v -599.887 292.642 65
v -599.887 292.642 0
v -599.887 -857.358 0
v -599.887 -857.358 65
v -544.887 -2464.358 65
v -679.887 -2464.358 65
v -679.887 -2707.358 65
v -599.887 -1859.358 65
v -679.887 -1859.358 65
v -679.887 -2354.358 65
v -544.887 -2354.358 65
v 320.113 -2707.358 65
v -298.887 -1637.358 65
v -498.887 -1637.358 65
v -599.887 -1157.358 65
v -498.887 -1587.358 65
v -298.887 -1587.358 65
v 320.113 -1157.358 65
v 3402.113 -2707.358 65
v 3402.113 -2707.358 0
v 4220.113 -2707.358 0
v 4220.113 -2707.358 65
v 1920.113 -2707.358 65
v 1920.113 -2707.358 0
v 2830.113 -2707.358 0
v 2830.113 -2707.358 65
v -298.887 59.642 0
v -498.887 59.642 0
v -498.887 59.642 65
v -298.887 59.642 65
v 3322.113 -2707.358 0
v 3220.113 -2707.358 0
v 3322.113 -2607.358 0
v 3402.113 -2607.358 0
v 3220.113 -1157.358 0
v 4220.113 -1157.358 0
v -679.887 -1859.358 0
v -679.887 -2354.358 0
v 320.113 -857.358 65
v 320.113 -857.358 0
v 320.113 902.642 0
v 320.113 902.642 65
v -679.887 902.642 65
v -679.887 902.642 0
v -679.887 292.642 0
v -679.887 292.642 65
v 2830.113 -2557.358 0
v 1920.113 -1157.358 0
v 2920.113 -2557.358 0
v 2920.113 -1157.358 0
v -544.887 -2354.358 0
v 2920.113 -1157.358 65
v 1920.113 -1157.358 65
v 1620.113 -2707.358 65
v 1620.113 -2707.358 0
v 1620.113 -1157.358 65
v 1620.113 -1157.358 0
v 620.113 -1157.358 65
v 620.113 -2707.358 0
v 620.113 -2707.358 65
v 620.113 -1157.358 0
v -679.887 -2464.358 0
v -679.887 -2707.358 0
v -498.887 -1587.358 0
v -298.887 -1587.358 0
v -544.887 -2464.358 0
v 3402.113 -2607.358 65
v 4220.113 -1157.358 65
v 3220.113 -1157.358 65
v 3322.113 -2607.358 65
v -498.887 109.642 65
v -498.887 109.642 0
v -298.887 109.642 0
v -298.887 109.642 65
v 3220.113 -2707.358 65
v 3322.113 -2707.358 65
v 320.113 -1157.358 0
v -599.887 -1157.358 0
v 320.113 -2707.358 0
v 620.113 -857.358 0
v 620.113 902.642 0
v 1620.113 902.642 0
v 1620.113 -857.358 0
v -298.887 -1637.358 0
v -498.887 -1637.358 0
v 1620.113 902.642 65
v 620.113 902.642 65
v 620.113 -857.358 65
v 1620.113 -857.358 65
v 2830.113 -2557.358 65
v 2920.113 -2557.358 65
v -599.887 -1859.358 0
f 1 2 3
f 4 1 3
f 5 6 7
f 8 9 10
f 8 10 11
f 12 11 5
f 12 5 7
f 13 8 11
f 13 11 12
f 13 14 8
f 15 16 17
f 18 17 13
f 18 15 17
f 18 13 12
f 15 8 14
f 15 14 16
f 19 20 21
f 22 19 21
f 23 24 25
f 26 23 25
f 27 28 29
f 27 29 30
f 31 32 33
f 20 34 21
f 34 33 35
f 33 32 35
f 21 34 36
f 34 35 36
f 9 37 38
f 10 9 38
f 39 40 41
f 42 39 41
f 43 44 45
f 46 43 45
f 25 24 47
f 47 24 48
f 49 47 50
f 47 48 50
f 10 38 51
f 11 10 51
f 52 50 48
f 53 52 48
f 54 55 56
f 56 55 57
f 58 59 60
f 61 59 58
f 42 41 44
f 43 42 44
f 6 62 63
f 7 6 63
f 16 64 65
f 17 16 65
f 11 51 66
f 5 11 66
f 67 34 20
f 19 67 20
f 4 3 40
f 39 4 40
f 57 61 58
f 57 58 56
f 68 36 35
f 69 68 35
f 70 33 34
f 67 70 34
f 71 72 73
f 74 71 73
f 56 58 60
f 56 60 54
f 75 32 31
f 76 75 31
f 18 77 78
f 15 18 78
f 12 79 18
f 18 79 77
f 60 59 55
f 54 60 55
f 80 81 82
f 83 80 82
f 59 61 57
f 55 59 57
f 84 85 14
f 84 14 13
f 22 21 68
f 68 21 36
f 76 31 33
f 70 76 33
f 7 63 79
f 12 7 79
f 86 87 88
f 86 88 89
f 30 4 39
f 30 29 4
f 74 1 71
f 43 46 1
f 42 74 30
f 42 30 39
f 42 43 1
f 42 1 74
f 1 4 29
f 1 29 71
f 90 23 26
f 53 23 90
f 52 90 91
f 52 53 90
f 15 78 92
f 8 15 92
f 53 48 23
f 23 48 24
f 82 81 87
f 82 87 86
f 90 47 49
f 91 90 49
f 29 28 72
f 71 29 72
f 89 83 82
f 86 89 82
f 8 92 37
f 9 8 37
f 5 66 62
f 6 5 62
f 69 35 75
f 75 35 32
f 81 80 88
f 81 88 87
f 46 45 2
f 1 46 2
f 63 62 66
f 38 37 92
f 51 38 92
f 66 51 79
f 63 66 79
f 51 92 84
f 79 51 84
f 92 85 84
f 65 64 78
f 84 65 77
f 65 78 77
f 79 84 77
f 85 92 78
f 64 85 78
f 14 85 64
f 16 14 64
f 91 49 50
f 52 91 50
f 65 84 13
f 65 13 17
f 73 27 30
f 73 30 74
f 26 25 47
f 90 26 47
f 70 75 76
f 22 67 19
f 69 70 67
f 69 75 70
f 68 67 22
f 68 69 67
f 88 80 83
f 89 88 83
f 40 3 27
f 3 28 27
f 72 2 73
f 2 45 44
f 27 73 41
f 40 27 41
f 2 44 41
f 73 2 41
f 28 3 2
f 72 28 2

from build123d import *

# Parameters (mm, degrees)
F0_W     = 200
F0_H     = 50
F0_W_2   = 1000
F0_H_2   = 1760
F0_H_3   = 1550
F1_DEPTH = 65


with BuildPart() as f1:
    # F0 (on Top) → F1 (new body)
    with BuildSketch(Plane.XY):
        Polygon((320.112689, 902.641755), (-679.887311, 902.641755), (-679.887311, 292.641755), (-599.887311, 292.641755), (-599.887311, -857.358245), (320.112689, -857.358245), align=None)
        with Locations((-398.887311, 84.641755)):
            Rectangle(F0_W, F0_H, mode=Mode.SUBTRACT)
        with Locations((1120.112689, 22.641755)):
            Rectangle(F0_W_2, F0_H_2)
        Polygon((320.112689, -1157.358245), (-599.887311, -1157.358245), (-599.887311, -1859.358245), (-679.887311, -1859.358245), (-679.887311, -2354.358245), (-544.887311, -2354.358245), (-544.887311, -2464.358245), (-679.887311, -2464.358245), (-679.887311, -2707.358245), (320.112689, -2707.358245), align=None)
        with Locations((-398.887311, -1612.358245)):
            Rectangle(F0_W, F0_H, mode=Mode.SUBTRACT)
        with Locations((1120.112689, -1932.358245)):
            Rectangle(F0_W_2, F0_H_3)
        Polygon((2920.112689, -1157.358245), (1920.112689, -1157.358245), (1920.112689, -2707.358245), (2830.112689, -2707.358245), (2830.112689, -2557.358245), (2920.112689, -2557.358245), align=None)
        Polygon((4220.112689, -1157.358245), (3220.112689, -1157.358245), (3220.112689, -2707.358245), (3322.112689, -2707.358245), (3322.112689, -2607.358245), (3402.112689, -2607.358245), (3402.112689, -2707.358245), (4220.112689, -2707.358245), align=None)
    extrude(amount=F1_DEPTH)


solid = f1.part
